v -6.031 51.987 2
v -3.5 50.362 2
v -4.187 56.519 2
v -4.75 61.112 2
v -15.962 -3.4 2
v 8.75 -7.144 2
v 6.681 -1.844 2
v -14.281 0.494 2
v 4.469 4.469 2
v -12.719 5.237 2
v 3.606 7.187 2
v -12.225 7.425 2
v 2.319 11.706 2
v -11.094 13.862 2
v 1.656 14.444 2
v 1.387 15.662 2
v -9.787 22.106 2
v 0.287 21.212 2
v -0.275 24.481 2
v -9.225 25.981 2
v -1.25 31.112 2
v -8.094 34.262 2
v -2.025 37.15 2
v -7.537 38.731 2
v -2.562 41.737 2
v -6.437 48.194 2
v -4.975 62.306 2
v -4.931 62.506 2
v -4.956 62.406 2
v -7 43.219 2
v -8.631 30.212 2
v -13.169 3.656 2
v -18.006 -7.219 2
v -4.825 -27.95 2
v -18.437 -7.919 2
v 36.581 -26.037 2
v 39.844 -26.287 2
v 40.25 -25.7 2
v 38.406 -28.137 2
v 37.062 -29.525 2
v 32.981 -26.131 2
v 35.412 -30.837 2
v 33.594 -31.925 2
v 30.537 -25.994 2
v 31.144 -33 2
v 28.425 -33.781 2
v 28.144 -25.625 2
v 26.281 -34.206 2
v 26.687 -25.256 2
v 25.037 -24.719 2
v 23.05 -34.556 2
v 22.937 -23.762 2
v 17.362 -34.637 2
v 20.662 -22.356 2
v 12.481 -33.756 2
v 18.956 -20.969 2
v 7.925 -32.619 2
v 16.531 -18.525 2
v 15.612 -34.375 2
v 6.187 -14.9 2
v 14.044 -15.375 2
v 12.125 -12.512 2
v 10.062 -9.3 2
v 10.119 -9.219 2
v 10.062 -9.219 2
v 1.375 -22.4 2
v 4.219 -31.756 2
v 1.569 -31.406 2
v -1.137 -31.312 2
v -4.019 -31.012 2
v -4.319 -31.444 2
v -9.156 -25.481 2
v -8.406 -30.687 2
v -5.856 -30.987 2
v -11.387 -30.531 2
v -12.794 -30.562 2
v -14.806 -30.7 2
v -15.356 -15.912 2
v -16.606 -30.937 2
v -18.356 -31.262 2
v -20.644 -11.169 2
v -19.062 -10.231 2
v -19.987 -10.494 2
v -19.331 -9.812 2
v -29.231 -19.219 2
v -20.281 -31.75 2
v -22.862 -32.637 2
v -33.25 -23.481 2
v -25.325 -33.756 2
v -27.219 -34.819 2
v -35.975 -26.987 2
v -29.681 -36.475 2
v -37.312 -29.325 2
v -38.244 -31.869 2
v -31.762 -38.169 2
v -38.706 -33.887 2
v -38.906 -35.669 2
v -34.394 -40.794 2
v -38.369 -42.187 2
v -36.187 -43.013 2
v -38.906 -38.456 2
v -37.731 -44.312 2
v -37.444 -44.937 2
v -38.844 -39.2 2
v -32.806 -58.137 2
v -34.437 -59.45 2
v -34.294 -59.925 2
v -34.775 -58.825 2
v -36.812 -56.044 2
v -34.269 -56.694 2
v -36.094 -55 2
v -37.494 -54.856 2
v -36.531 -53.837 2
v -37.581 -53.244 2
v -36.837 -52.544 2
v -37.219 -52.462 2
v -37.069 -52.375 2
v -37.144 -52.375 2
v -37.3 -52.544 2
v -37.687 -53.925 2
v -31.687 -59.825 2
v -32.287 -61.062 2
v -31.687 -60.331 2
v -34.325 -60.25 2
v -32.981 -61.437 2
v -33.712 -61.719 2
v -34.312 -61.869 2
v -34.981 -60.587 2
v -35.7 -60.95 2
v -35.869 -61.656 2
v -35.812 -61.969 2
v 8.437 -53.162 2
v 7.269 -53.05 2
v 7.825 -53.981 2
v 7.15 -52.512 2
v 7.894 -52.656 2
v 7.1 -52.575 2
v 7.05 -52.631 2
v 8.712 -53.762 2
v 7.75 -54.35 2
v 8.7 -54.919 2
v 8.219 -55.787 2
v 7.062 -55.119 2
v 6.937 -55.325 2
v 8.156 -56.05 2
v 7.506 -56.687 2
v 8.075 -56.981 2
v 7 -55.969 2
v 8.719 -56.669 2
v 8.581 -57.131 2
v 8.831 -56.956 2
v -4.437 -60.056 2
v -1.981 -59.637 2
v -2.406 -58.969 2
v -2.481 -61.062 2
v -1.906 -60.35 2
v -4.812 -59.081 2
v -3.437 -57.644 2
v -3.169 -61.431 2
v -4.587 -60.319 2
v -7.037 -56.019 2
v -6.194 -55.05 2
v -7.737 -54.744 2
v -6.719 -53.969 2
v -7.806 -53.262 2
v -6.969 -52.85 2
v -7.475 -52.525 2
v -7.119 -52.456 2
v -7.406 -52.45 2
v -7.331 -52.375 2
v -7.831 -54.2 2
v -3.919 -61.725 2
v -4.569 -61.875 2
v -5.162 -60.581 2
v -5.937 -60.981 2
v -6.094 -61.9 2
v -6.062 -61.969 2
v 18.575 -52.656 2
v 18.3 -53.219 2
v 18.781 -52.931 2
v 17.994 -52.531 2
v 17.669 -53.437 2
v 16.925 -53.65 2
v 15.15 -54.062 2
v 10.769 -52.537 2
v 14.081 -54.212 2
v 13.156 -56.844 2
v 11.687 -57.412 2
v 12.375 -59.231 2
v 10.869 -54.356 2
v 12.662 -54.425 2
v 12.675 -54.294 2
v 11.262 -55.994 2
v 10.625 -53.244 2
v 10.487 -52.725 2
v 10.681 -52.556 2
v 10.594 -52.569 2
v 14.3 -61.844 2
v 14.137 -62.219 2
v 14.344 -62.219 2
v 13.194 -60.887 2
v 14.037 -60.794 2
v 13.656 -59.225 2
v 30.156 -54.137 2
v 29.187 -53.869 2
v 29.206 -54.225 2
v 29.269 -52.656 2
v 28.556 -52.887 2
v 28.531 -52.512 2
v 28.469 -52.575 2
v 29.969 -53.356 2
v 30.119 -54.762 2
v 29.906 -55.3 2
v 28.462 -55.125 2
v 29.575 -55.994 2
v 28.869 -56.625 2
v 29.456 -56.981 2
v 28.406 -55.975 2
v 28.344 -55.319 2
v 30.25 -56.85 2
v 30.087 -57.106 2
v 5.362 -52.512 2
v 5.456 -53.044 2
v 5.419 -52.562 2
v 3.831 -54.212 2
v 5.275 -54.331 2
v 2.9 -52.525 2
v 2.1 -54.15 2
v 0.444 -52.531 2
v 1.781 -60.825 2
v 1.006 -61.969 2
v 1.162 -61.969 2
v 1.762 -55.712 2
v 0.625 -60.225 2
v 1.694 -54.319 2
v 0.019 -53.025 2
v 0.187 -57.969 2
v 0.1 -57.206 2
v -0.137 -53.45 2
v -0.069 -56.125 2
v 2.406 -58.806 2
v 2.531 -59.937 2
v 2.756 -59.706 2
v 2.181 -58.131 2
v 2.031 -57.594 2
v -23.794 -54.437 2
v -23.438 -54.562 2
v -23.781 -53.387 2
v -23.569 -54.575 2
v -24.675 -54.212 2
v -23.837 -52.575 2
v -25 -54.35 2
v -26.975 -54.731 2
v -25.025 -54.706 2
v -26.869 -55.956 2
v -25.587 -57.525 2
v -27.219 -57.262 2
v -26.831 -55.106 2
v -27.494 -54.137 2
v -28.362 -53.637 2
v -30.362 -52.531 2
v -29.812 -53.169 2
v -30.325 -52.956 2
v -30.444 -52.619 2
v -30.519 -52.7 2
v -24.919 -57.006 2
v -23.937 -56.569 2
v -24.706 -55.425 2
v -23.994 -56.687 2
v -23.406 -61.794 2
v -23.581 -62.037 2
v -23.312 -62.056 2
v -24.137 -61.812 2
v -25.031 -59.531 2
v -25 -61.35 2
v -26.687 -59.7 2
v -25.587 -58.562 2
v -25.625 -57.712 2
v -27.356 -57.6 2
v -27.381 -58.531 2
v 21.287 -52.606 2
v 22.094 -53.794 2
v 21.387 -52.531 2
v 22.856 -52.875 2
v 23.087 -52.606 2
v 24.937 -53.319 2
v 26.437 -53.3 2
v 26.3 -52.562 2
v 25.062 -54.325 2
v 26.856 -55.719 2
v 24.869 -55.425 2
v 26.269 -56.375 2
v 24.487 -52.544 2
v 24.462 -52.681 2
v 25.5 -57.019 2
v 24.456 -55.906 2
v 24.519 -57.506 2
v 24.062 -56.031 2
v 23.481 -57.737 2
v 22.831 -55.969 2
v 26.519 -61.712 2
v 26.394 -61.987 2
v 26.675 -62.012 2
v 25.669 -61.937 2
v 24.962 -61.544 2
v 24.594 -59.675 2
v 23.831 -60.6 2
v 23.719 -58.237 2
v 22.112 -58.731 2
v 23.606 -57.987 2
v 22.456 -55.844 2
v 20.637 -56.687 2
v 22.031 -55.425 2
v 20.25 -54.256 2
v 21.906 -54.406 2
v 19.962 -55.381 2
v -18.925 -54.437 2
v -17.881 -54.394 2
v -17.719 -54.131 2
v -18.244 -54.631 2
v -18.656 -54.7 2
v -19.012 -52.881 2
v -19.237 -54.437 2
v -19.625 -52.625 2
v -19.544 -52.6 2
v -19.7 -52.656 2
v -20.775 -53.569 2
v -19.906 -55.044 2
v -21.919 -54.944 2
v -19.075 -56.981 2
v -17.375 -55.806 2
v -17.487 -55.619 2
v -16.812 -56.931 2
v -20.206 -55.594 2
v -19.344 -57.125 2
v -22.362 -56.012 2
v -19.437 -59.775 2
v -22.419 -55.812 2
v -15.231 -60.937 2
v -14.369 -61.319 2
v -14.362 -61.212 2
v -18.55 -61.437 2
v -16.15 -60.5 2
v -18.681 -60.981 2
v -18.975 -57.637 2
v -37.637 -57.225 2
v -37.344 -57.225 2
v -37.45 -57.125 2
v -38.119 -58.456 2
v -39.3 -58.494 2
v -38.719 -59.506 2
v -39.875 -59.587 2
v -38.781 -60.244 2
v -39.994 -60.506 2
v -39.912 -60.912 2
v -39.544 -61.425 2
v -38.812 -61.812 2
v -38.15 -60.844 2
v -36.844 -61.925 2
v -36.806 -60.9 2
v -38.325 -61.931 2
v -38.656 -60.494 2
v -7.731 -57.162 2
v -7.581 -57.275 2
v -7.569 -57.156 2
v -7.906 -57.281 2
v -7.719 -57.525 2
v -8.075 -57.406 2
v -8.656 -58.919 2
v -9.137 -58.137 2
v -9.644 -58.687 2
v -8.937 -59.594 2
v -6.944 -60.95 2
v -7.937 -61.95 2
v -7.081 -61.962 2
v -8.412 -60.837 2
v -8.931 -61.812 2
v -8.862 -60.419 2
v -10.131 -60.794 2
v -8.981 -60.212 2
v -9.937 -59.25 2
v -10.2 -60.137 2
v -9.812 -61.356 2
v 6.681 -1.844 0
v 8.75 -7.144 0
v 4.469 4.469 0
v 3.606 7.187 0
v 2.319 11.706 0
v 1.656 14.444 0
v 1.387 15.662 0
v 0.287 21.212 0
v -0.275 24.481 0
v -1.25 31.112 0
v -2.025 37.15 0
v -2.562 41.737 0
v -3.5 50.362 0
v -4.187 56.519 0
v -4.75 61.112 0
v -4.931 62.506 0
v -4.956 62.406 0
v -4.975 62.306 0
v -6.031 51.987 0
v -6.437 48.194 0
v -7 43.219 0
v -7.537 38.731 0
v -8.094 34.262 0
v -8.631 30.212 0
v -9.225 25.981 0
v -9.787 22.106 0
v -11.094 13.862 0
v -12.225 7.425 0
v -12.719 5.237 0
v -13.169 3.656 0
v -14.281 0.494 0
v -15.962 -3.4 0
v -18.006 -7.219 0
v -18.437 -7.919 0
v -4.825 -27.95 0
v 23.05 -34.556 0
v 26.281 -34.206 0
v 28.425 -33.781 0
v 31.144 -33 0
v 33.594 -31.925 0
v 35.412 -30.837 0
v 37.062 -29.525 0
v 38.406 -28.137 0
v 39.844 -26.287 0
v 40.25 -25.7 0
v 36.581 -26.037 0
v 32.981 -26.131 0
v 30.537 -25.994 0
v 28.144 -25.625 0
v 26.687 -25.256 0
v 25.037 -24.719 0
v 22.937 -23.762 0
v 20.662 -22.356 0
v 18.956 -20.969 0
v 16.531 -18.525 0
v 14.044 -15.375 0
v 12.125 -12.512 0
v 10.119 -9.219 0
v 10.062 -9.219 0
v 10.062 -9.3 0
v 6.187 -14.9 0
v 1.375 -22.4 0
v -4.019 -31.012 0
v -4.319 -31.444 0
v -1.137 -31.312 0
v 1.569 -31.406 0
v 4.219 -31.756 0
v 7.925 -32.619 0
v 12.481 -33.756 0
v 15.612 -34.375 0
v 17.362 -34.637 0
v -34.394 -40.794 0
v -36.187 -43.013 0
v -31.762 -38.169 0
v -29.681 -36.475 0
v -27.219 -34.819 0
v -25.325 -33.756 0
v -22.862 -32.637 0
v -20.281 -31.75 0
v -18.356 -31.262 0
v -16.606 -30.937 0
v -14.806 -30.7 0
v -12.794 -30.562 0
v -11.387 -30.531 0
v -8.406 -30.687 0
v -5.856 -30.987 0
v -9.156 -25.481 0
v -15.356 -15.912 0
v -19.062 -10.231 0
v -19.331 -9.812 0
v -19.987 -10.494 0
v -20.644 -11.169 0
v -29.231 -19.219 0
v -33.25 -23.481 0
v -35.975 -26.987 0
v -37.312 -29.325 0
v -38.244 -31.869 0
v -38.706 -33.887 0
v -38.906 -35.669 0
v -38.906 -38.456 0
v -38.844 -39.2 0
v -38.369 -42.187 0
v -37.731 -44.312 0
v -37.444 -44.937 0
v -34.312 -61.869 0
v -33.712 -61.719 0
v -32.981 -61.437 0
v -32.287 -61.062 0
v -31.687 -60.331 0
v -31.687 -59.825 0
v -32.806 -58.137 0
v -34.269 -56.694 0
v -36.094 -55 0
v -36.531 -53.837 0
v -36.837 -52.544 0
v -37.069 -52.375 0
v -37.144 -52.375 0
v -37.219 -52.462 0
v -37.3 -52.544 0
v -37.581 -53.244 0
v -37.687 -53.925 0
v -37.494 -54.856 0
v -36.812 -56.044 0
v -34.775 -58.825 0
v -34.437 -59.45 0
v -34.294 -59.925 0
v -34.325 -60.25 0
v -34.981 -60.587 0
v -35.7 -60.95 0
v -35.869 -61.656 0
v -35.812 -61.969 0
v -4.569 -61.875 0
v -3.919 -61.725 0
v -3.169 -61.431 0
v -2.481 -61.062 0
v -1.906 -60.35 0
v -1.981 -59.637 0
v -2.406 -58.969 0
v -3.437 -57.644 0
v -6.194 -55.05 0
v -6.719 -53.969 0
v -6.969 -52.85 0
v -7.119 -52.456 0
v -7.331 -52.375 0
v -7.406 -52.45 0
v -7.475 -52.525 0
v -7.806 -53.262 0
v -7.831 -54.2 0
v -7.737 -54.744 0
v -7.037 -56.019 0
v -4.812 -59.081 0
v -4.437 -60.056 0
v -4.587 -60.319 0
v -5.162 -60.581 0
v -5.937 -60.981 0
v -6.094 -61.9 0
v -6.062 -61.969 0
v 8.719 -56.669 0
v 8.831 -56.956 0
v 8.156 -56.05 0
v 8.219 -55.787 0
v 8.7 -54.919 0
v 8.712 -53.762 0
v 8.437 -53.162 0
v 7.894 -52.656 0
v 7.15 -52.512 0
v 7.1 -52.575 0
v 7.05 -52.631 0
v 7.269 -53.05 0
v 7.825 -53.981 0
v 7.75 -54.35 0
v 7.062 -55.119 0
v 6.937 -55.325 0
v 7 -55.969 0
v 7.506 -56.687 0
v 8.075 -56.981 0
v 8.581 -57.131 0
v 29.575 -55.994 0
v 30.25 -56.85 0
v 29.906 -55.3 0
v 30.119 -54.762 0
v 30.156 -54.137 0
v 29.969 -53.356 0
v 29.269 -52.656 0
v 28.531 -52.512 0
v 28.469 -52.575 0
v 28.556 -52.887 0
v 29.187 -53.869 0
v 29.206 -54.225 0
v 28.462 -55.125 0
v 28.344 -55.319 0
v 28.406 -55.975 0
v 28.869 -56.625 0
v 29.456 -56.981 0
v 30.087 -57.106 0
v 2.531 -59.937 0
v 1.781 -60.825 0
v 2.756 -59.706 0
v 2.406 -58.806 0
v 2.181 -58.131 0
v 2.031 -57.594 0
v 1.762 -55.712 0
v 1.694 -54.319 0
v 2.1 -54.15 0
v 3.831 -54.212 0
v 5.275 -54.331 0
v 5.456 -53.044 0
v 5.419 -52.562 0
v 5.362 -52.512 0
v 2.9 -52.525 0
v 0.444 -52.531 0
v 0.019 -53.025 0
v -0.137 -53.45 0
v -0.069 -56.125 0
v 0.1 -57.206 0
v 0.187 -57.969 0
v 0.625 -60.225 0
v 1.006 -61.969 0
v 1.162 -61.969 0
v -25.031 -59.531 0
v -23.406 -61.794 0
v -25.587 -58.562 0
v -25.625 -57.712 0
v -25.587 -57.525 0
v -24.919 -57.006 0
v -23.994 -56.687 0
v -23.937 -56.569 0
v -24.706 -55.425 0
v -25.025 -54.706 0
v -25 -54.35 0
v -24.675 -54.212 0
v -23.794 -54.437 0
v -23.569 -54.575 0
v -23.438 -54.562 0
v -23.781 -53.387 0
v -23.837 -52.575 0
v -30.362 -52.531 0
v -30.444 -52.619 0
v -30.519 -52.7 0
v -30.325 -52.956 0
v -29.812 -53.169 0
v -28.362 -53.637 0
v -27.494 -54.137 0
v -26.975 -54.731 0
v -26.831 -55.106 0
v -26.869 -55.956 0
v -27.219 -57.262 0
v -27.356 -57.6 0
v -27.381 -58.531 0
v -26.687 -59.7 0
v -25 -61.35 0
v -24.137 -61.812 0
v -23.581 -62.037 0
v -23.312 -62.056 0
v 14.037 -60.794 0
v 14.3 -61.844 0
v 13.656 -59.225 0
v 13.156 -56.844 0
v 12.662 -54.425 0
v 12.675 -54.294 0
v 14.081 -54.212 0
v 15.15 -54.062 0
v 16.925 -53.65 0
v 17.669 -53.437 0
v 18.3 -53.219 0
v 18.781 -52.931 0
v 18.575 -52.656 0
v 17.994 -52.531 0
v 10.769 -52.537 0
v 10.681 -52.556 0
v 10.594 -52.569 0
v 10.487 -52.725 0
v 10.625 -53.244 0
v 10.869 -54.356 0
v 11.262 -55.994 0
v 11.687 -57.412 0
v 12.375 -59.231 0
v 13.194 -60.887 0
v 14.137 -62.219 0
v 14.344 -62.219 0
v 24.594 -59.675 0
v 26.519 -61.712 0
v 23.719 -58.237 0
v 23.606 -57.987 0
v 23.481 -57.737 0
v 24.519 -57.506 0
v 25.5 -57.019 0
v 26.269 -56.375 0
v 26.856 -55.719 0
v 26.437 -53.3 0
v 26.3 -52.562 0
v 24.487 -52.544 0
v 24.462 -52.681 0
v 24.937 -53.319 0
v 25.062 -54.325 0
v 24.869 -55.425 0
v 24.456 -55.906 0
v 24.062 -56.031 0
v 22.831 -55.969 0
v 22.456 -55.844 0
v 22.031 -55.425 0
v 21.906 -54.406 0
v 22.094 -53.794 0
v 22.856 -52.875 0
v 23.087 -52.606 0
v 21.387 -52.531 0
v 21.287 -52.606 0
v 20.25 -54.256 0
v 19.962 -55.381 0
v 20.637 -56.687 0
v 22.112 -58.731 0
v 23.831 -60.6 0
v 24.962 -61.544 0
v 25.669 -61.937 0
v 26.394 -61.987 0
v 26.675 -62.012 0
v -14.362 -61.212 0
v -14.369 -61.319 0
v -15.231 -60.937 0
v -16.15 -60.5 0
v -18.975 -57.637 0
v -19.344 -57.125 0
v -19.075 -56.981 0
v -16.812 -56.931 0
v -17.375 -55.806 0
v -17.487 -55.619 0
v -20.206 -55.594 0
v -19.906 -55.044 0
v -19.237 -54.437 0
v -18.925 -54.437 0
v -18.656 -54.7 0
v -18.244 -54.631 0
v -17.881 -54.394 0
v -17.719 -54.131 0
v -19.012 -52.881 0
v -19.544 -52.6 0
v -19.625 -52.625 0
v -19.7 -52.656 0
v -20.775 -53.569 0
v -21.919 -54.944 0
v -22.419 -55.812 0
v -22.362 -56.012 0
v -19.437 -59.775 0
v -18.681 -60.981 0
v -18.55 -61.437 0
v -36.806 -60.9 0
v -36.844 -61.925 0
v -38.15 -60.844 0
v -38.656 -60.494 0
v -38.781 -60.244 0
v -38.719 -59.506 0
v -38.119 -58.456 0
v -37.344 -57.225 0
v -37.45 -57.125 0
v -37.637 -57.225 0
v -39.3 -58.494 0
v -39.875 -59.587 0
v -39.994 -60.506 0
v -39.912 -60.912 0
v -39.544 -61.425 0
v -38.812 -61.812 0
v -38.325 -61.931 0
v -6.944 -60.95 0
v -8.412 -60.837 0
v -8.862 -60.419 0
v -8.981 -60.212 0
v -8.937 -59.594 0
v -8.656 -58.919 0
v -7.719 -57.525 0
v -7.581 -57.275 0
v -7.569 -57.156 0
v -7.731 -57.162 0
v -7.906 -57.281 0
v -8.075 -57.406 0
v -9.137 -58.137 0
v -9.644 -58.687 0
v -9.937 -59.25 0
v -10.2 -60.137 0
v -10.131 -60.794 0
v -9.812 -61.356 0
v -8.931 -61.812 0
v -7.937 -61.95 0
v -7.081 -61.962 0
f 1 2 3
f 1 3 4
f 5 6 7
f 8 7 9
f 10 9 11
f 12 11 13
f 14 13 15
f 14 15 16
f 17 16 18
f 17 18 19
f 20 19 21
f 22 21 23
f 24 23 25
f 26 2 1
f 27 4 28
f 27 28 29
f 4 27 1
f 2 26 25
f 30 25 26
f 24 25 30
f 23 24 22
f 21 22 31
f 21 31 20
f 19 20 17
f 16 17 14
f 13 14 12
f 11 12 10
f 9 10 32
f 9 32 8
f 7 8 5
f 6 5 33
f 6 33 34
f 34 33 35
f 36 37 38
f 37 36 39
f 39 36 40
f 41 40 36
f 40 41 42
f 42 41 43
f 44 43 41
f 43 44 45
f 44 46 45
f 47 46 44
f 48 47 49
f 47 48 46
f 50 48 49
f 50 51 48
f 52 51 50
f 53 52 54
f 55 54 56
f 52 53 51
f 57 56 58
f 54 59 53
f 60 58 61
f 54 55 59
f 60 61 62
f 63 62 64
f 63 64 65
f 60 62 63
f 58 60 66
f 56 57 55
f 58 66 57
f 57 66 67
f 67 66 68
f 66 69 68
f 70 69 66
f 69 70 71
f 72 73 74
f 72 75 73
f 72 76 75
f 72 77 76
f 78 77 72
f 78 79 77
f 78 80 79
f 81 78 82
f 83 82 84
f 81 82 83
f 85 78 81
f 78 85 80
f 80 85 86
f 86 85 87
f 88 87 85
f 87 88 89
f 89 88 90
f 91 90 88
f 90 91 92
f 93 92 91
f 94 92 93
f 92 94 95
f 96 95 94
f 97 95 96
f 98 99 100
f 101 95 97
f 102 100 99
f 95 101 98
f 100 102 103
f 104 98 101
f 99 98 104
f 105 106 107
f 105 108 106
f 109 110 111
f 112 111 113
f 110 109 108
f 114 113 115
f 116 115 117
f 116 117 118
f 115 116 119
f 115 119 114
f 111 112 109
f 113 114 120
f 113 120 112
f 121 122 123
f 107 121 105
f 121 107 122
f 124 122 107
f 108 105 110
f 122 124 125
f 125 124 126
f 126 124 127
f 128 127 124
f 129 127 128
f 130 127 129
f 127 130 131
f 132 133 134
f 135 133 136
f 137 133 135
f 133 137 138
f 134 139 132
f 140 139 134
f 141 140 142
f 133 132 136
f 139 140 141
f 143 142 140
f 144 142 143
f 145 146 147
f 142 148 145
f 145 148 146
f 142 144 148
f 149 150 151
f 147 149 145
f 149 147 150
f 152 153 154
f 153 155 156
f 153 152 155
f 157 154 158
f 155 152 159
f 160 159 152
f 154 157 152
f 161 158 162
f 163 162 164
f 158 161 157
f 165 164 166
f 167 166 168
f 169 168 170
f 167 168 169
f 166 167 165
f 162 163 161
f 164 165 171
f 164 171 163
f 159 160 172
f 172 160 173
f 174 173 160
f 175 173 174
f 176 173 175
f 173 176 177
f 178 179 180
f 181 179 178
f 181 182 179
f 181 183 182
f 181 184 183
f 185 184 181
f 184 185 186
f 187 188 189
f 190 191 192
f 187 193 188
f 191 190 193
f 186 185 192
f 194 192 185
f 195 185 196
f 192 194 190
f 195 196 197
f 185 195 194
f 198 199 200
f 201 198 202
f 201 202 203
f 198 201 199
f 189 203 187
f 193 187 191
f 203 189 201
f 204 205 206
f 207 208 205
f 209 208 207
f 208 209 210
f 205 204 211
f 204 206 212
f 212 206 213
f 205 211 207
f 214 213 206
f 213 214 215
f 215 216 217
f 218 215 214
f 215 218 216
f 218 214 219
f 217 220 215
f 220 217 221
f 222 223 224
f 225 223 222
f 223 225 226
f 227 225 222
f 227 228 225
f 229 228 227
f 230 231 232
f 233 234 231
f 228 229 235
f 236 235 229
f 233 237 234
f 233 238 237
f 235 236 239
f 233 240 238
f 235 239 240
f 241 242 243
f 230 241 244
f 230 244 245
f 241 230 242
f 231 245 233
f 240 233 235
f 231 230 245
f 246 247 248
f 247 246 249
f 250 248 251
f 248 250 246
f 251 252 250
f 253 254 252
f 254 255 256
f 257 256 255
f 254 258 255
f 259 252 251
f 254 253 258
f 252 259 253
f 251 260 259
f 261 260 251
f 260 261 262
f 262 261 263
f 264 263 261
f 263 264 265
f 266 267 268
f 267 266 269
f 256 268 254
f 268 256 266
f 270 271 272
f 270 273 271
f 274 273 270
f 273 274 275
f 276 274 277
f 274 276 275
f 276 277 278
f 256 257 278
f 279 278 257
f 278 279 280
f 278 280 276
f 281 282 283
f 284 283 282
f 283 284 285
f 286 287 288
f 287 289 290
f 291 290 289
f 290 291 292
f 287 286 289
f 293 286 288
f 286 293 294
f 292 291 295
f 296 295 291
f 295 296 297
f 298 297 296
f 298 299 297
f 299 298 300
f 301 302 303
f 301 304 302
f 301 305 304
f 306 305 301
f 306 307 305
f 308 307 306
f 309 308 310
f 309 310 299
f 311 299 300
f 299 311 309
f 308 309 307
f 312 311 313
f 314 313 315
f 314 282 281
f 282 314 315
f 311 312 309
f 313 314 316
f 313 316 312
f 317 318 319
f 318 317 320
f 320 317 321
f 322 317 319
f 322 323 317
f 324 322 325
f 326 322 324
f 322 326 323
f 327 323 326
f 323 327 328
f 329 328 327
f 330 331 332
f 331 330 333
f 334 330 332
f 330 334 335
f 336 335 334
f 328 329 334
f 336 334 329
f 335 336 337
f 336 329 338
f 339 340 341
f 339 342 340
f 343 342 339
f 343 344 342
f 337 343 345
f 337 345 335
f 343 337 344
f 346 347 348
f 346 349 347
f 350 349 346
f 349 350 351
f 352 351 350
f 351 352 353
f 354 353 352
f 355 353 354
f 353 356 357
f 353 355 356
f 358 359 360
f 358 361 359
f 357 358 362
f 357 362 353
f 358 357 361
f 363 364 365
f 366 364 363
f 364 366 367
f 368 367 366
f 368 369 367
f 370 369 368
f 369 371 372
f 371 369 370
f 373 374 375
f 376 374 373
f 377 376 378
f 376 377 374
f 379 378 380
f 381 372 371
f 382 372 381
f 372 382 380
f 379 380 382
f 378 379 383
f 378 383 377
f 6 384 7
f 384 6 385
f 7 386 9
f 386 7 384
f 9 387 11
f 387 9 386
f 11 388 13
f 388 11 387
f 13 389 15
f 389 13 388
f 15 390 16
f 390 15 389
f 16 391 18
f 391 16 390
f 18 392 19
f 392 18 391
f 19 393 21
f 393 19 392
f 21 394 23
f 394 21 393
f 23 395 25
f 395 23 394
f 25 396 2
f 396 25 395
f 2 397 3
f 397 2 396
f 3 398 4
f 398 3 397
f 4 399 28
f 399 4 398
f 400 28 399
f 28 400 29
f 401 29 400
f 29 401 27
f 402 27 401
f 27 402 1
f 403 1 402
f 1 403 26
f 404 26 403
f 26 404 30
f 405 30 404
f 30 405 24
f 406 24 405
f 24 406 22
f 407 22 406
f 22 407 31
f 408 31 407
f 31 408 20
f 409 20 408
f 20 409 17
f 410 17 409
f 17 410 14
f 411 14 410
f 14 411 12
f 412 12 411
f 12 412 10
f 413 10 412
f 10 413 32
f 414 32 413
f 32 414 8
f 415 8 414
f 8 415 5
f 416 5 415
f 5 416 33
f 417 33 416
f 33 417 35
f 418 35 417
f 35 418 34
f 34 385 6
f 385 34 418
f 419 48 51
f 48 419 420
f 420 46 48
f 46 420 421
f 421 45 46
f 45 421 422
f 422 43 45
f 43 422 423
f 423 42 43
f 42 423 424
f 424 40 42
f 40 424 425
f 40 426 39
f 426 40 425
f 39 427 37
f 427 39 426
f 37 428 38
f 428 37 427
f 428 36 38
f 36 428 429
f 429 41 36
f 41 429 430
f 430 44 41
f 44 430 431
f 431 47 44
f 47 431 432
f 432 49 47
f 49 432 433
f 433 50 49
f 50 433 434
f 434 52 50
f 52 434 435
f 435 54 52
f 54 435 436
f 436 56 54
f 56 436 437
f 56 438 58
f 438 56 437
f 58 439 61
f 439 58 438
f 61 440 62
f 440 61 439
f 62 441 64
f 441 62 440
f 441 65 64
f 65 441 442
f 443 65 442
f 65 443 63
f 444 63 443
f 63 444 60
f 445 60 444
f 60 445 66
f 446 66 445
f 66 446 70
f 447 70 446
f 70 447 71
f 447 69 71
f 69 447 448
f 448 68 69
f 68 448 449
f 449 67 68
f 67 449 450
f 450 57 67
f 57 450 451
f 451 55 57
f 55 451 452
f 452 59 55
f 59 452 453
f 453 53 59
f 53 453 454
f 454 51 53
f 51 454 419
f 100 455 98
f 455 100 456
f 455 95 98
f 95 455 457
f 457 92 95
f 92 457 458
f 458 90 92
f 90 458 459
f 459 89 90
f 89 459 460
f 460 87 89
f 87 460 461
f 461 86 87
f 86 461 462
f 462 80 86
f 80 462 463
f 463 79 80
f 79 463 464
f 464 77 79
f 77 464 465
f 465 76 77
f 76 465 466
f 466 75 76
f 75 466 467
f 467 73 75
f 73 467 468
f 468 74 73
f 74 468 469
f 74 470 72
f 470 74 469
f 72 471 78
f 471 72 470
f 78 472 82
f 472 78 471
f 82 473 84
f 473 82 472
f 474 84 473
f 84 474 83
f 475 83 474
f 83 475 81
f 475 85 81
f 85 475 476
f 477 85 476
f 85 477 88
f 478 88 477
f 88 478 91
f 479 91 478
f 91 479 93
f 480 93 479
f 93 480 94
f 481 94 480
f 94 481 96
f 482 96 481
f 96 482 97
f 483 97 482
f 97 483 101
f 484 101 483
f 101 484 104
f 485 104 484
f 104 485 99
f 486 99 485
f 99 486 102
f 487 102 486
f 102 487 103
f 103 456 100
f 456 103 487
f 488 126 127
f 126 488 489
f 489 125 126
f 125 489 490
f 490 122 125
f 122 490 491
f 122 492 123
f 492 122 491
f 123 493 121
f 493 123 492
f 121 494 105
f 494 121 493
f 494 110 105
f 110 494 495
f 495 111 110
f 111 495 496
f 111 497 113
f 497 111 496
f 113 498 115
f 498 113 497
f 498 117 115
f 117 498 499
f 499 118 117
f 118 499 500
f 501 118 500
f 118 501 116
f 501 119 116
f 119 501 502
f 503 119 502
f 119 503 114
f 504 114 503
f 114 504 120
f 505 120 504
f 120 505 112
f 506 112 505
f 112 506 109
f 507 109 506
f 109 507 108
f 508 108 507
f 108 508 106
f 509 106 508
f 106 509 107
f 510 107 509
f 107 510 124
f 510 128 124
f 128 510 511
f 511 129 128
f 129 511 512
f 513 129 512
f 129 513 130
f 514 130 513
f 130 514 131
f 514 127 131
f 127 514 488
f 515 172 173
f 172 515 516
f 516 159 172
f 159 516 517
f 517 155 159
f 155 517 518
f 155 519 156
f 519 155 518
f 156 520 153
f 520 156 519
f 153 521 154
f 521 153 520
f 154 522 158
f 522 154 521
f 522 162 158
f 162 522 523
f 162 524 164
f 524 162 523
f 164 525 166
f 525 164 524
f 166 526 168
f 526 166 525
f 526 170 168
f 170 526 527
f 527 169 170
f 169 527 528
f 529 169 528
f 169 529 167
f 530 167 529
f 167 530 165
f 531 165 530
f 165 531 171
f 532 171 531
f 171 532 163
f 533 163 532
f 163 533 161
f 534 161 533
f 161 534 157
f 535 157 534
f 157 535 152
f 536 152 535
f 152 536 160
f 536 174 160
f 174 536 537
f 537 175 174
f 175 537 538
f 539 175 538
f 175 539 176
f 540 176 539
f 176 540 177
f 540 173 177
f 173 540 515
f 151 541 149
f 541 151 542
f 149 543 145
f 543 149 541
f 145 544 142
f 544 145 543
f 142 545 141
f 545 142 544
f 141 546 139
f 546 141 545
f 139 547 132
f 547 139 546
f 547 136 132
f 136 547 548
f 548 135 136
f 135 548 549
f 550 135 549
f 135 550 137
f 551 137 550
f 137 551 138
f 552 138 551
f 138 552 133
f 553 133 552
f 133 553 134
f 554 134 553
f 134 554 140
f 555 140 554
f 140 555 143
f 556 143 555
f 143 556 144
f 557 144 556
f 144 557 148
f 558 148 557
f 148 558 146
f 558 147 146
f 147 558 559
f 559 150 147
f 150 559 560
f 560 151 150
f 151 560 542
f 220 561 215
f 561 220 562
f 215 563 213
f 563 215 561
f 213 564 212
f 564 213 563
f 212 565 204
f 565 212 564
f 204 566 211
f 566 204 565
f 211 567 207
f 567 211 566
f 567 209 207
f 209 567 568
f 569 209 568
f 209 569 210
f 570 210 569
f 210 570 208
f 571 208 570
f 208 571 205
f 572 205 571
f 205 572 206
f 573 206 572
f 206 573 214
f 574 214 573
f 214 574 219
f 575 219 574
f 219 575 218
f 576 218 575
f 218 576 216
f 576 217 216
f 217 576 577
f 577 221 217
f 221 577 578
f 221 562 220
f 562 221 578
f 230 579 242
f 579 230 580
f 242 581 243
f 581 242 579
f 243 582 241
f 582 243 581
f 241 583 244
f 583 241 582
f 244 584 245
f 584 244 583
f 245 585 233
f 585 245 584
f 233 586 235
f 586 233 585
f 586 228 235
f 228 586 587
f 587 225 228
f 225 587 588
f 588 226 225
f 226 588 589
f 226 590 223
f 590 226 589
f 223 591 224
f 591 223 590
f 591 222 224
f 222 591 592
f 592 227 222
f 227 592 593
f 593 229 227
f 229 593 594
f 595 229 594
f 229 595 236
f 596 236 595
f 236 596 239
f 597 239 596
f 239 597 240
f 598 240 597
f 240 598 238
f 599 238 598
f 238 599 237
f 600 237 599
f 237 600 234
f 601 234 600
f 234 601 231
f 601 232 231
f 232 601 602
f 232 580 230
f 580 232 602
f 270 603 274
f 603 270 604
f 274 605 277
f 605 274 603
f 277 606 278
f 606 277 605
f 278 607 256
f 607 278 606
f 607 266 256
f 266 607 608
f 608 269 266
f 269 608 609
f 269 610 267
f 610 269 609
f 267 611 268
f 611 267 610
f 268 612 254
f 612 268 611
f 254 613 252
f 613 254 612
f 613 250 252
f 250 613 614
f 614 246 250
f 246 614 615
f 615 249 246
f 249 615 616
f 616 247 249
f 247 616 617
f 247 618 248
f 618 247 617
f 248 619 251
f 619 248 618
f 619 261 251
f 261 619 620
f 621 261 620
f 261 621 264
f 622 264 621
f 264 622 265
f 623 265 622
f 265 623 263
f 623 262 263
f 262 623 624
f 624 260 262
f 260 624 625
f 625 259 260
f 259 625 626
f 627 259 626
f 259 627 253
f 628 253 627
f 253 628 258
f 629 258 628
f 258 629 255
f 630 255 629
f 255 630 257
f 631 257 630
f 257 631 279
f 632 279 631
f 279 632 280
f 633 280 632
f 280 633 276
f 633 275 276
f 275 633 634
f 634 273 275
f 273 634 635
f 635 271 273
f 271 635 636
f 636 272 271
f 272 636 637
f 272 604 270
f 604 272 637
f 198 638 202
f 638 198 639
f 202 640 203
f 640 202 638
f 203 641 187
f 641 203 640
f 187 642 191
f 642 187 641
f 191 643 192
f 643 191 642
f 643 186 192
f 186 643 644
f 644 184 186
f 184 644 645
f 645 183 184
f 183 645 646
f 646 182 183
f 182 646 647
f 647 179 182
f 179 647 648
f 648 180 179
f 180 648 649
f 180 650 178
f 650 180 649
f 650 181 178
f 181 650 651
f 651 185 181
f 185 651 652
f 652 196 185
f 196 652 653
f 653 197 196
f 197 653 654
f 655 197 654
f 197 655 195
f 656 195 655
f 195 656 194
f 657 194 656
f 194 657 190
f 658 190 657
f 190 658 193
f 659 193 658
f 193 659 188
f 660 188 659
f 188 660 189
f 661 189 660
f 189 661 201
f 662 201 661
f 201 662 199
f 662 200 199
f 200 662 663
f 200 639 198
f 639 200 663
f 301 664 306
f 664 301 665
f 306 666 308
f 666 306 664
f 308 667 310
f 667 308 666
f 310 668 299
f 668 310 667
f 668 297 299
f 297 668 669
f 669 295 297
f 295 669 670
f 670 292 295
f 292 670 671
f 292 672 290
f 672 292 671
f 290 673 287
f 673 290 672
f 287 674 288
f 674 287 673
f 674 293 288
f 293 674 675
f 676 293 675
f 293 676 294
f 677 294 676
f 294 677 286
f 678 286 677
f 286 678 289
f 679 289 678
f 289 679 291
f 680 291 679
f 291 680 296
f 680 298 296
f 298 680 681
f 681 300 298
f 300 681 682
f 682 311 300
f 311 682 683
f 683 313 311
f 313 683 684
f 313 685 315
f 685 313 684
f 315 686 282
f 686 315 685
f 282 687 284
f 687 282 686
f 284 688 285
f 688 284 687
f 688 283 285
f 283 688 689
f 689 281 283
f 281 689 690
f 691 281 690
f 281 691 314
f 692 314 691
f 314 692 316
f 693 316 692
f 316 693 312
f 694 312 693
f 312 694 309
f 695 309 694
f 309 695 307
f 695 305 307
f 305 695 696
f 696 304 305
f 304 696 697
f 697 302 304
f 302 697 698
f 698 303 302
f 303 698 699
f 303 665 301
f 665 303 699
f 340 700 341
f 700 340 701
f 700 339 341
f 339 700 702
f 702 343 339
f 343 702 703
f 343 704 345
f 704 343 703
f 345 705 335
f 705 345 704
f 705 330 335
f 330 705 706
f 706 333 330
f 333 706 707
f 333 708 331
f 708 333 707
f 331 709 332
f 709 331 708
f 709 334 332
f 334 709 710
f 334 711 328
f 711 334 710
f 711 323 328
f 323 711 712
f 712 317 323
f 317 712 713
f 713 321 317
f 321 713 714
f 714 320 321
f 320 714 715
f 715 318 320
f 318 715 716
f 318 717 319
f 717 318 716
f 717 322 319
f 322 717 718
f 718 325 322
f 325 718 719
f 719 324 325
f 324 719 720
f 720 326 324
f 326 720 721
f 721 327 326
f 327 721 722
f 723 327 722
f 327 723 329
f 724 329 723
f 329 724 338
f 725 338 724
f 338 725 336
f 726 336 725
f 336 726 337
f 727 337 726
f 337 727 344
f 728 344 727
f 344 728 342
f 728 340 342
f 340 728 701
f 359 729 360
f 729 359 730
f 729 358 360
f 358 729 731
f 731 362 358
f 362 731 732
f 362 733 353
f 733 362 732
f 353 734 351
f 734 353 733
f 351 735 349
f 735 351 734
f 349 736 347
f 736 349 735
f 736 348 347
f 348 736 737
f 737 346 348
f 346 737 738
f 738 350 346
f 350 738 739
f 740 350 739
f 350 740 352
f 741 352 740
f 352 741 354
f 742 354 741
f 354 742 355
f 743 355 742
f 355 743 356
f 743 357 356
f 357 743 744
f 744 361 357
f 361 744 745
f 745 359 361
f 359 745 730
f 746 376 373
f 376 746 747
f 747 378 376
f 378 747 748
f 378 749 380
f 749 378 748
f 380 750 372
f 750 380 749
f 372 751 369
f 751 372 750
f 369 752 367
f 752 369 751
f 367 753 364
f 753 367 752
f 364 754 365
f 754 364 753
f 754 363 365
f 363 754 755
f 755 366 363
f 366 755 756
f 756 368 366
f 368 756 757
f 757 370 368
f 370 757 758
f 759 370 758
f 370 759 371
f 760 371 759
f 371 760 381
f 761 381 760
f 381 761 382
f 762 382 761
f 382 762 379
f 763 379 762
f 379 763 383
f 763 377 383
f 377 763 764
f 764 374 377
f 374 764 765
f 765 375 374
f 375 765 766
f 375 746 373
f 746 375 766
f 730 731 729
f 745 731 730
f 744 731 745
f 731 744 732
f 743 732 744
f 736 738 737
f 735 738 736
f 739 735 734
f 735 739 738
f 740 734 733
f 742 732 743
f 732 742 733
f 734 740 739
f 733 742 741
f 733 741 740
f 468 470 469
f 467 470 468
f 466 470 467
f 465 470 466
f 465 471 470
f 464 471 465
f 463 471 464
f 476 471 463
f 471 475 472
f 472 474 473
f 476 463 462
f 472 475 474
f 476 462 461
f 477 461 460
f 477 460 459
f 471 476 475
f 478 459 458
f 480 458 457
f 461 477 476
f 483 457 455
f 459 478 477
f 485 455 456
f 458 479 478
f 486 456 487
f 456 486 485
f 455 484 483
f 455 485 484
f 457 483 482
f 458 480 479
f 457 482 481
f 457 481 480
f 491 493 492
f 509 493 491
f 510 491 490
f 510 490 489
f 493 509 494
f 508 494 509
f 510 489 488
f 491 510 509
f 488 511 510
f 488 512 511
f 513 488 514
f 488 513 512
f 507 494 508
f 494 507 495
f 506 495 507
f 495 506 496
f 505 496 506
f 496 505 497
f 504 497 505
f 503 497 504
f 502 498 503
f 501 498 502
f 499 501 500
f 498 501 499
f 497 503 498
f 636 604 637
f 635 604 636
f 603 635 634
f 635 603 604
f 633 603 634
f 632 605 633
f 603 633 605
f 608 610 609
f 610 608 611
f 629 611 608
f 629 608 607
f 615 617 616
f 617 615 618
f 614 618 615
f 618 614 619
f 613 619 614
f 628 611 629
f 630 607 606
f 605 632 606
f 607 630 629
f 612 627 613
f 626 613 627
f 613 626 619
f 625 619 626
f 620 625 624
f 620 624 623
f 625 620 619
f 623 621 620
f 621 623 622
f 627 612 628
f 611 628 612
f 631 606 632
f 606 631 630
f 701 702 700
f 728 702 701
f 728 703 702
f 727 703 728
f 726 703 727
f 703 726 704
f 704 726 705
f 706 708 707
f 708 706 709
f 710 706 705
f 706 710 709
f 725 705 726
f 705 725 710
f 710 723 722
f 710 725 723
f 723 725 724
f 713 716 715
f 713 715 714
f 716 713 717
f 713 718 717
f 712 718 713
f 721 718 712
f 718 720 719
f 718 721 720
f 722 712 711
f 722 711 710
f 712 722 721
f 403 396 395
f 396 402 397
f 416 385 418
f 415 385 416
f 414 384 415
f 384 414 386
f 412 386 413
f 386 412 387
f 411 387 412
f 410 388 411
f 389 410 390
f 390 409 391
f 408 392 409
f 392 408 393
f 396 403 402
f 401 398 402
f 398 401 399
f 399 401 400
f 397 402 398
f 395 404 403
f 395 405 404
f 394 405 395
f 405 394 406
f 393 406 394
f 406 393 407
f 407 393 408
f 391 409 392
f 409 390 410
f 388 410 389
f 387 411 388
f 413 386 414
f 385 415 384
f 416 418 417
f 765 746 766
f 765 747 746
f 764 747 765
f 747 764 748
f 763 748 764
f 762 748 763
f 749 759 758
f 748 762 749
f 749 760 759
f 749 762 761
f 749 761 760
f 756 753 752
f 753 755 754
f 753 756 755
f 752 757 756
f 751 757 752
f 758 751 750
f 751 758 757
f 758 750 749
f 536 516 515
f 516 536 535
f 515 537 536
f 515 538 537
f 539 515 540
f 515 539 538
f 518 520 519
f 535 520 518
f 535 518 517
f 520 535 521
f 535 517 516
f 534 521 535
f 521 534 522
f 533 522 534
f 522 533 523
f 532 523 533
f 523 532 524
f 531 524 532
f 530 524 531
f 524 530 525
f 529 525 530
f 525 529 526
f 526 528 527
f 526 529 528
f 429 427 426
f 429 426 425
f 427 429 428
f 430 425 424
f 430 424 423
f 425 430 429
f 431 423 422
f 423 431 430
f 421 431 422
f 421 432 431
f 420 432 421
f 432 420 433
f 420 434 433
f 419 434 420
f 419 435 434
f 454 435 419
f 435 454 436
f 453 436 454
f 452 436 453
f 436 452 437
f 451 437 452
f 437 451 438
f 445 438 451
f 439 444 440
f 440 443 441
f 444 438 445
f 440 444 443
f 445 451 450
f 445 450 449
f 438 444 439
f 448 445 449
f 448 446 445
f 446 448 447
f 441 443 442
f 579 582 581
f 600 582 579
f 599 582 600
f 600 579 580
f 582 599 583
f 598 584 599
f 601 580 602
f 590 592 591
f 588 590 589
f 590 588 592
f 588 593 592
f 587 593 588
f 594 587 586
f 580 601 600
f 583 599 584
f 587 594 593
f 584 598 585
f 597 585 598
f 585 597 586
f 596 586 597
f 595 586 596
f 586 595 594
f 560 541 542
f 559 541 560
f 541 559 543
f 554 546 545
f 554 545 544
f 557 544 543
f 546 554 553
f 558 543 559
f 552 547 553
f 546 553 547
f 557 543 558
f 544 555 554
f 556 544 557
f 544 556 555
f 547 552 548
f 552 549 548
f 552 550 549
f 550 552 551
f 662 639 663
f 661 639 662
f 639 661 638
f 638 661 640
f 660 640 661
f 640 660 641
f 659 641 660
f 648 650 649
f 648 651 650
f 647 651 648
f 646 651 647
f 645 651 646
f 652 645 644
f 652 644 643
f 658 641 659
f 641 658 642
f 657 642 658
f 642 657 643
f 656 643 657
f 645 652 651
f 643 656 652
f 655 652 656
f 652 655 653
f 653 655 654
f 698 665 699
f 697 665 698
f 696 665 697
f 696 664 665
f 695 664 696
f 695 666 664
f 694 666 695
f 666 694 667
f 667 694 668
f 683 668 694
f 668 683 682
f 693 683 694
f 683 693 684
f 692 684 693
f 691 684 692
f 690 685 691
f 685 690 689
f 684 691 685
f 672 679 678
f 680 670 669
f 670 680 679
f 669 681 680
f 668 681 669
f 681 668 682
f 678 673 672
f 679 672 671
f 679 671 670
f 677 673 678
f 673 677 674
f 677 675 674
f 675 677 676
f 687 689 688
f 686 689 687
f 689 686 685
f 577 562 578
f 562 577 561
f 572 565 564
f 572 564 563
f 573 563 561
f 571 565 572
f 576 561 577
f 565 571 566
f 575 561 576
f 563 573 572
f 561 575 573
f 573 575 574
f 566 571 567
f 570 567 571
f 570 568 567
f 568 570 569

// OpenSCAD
module 9a4b62c55d1f33ee8902498954ed7353_1()
{
 /* Generated by trace2scad version 20150415
    http://aggregate.org/MAKE/TRACE2SCAD/
    Optimized model has 387/4796 original points
 */
 color([0.48, 0.48, 0.48])
 assign(minx=0) /* polygon minx=39 */
 assign(miny=0) /* polygon miny=45 */
 assign(maxx=12880) /* polygon maxx=12880 */
 assign(maxy=20000) /* polygon maxy=20001 */
 assign(dx=maxx-minx)
 assign(dy=maxy-miny)
 assign(maxd=((dx>dy)?dx:dy))
 scale([1/maxd, 1/maxd, 1])
 translate([-minx-dx/2, -miny-dy/2, 0])
 linear_extrude(height=1, convexity=387)
 union() {
  union() {
   polygon([[5647,19985],[5644,19969],[5475,18318],[5410,17711],[5320,16915],[5234,16197],[5145,15482],[5059,14834],[4964,14157],[4874,13537],[4665,12218],[4484,11188],[4405,10838],[4333,10585],[4155,10079],[3886,9456],[3559,8845],[3490,8733],[5668,5528],[7840,8857],[7509,9705],[7155,10715],[7017,11150],[6811,11873],[6705,12311],[6662,12506],[6486,13394],[6396,13917],[6240,14978],[6116,15944],[6030,16678],[5880,18058],[5770,19043],[5680,19778],[5651,20001]], convexity=6);
   polygon([[8050,8518],[8050,8512],[7430,7616],[6660,6416],[5797,5038],[5749,4969],[6258,4990],[6691,4975],[7115,4919],[7708,4781],[8437,4599],[8938,4500],[9218,4458],[10128,4471],[10645,4527],[10988,4595],[11423,4720],[11815,4892],[12106,5066],[12370,5276],[12585,5498],[12815,5794],[12880,5888],[12293,5834],[11717,5819],[11326,5841],[10943,5900],[10710,5959],[10446,6045],[10110,6198],[9746,6423],[9473,6645],[9085,7036],[8687,7540],[8380,7998],[8059,8525],[8050,8525]], convexity=9);
   polygon([[3242,8321],[3137,8213],[1763,6925],[1120,6243],[684,5682],[470,5308],[321,4901],[247,4578],[215,4293],[215,3847],[225,3728],[301,3250],[403,2910],[449,2810],[650,3118],[937,3473],[1358,3893],[1691,4164],[2085,4429],[2388,4599],[2782,4778],[3195,4920],[3503,4998],[3783,5050],[4071,5088],[4393,5110],[4618,5115],[5095,5090],[5503,5042],[4975,5923],[3983,7454],[3390,8363],[3347,8430]], convexity=7);
   polygon([[485,1606],[472,1593],[427,1481],[410,1372],[441,1223],[550,1033],[876,588],[930,488],[953,412],[948,360],[843,306],[728,248],[701,135],[710,85],[950,101],[1046,125],[1163,170],[1274,230],[1370,347],[1370,428],[1191,698],[957,929],[665,1200],[595,1386],[546,1593],[509,1620],[497,1620]], convexity=8);
   polygon([[5255,1608],[5244,1596],[5191,1478],[5187,1328],[5202,1241],[5314,1037],[5670,547],[5730,391],[5706,349],[5614,307],[5490,243],[5465,96],[5470,85],[5709,100],[5813,124],[5933,171],[6043,230],[6135,344],[6123,458],[6055,565],[5890,777],[5449,1192],[5365,1365],[5325,1544],[5301,1607],[5267,1620]], convexity=8);
   polygon([[6904,1596],[6511,1595],[6443,1516],[6418,1448],[6429,1020],[6456,847],[6470,725],[6540,364],[6601,85],[6626,85],[6725,268],[6845,410],[6881,447],[6825,591],[6789,699],[6765,785],[6722,1086],[6711,1309],[6776,1336],[7053,1326],[7284,1307],[7313,1513],[7307,1590],[7298,1598]], convexity=10);
   polygon([[7576,1588],[7568,1579],[7603,1512],[7692,1363],[7680,1304],[7570,1181],[7550,1148],[7560,1045],[7641,930],[7732,883],[7813,859],[7853,887],[7835,933],[7745,1032],[7755,1074],[7832,1213],[7834,1398],[7790,1494],[7703,1575],[7584,1598]], convexity=10);
   polygon([[11000,1593],[10995,1588],[11009,1538],[11110,1381],[11113,1324],[10994,1180],[10975,1149],[10985,1044],[11059,940],[11153,883],[11254,863],[11280,904],[11172,1041],[11225,1152],[11259,1238],[11265,1338],[11235,1463],[11123,1575],[11005,1598]], convexity=10);
   polygon([[1569,1581],[1557,1568],[1588,1527],[1670,1493],[1902,1418],[2041,1338],[2124,1243],[2147,1183],[2141,1047],[2085,838],[2063,784],[2059,635],[2170,448],[2440,184],[2578,110],[2667,74],[2710,71],[2695,113],[2435,475],[2346,630],[2340,766],[2346,796],[2453,879],[2601,930],[2610,949],[2487,1132],[2436,1247],[2440,1304],[2492,1326],[2633,1290],[2669,1268],[2690,1270],[2635,1458],[2626,1588],[1582,1595]], convexity=13);
   polygon([[8149,1591],[8135,1589],[8118,1564],[8140,1481],[8179,1303],[8242,1041],[8310,814],[8420,523],[8551,258],[8702,45],[8735,45],[8728,105],[8686,273],[8625,524],[8545,905],[8466,1292],[8468,1313],[8693,1326],[8864,1350],[9148,1416],[9267,1450],[9368,1485],[9445,1531],[9412,1575],[9319,1595],[8163,1594]], convexity=9);
   polygon([[9854,1589],[9846,1583],[9680,1319],[9634,1139],[9742,930],[9978,603],[10253,304],[10434,153],[10547,90],[10663,82],[10708,78],[10683,126],[10375,452],[10235,682],[10217,722],[10197,762],[10363,799],[10520,877],[10643,980],[10737,1085],[10670,1472],[10648,1590],[10358,1593],[10354,1571],[10430,1469],[10450,1308],[10419,1132],[10353,1055],[10290,1035],[10093,1045],[10033,1065],[9965,1132],[9945,1295],[9975,1393],[10097,1540],[10134,1583],[9862,1595]], convexity=13);
   polygon([[3300,1580],[3288,1575],[3116,1429],[2933,1209],[2853,1070],[2862,1038],[3330,436],[3451,243],[3472,170],[4141,189],[4142,206],[4003,250],[3856,320],[3404,778],[3345,860],[3388,883],[3750,891],[3660,1071],[3642,1101],[3207,1105],[3255,1193],[3362,1290],[3412,1290],[3455,1248],[3521,1259],[3579,1297],[3605,1339],[3398,1539],[3313,1584]], convexity=12);
   polygon([[433,852],[418,844],[152,641],[60,466],[41,319],[54,254],[113,172],[230,110],[308,91],[545,92],[551,256],[336,265],[255,321],[235,361],[245,479],[341,647],[465,844],[448,860]], convexity=8);
   polygon([[5175,835],[5148,815],[4978,698],[4897,610],[4850,520],[4808,378],[4819,273],[4870,183],[5011,110],[5170,88],[5307,86],[5329,248],[5094,266],[5022,333],[5003,366],[5010,465],[5055,573],[5205,796],[5227,836],[5229,855],[5203,854]], convexity=8);
  }
 }
}

module 9a4b62c55d1f33ee8902498954ed7353()
{
 /* all layers combined, scaled to within a 1mm cube */
 scale([1, 1, 1/1])
 difference() {
  union() {
   scale([1,1,2]) translate([0,0,-0.5]) 9a4b62c55d1f33ee8902498954ed7353_1();
  }
  translate([0,0,-2]) cube([2,2,4],center=true);
 }
}

scale([125, 125, 2]) {
	9a4b62c55d1f33ee8902498954ed7353();
}
